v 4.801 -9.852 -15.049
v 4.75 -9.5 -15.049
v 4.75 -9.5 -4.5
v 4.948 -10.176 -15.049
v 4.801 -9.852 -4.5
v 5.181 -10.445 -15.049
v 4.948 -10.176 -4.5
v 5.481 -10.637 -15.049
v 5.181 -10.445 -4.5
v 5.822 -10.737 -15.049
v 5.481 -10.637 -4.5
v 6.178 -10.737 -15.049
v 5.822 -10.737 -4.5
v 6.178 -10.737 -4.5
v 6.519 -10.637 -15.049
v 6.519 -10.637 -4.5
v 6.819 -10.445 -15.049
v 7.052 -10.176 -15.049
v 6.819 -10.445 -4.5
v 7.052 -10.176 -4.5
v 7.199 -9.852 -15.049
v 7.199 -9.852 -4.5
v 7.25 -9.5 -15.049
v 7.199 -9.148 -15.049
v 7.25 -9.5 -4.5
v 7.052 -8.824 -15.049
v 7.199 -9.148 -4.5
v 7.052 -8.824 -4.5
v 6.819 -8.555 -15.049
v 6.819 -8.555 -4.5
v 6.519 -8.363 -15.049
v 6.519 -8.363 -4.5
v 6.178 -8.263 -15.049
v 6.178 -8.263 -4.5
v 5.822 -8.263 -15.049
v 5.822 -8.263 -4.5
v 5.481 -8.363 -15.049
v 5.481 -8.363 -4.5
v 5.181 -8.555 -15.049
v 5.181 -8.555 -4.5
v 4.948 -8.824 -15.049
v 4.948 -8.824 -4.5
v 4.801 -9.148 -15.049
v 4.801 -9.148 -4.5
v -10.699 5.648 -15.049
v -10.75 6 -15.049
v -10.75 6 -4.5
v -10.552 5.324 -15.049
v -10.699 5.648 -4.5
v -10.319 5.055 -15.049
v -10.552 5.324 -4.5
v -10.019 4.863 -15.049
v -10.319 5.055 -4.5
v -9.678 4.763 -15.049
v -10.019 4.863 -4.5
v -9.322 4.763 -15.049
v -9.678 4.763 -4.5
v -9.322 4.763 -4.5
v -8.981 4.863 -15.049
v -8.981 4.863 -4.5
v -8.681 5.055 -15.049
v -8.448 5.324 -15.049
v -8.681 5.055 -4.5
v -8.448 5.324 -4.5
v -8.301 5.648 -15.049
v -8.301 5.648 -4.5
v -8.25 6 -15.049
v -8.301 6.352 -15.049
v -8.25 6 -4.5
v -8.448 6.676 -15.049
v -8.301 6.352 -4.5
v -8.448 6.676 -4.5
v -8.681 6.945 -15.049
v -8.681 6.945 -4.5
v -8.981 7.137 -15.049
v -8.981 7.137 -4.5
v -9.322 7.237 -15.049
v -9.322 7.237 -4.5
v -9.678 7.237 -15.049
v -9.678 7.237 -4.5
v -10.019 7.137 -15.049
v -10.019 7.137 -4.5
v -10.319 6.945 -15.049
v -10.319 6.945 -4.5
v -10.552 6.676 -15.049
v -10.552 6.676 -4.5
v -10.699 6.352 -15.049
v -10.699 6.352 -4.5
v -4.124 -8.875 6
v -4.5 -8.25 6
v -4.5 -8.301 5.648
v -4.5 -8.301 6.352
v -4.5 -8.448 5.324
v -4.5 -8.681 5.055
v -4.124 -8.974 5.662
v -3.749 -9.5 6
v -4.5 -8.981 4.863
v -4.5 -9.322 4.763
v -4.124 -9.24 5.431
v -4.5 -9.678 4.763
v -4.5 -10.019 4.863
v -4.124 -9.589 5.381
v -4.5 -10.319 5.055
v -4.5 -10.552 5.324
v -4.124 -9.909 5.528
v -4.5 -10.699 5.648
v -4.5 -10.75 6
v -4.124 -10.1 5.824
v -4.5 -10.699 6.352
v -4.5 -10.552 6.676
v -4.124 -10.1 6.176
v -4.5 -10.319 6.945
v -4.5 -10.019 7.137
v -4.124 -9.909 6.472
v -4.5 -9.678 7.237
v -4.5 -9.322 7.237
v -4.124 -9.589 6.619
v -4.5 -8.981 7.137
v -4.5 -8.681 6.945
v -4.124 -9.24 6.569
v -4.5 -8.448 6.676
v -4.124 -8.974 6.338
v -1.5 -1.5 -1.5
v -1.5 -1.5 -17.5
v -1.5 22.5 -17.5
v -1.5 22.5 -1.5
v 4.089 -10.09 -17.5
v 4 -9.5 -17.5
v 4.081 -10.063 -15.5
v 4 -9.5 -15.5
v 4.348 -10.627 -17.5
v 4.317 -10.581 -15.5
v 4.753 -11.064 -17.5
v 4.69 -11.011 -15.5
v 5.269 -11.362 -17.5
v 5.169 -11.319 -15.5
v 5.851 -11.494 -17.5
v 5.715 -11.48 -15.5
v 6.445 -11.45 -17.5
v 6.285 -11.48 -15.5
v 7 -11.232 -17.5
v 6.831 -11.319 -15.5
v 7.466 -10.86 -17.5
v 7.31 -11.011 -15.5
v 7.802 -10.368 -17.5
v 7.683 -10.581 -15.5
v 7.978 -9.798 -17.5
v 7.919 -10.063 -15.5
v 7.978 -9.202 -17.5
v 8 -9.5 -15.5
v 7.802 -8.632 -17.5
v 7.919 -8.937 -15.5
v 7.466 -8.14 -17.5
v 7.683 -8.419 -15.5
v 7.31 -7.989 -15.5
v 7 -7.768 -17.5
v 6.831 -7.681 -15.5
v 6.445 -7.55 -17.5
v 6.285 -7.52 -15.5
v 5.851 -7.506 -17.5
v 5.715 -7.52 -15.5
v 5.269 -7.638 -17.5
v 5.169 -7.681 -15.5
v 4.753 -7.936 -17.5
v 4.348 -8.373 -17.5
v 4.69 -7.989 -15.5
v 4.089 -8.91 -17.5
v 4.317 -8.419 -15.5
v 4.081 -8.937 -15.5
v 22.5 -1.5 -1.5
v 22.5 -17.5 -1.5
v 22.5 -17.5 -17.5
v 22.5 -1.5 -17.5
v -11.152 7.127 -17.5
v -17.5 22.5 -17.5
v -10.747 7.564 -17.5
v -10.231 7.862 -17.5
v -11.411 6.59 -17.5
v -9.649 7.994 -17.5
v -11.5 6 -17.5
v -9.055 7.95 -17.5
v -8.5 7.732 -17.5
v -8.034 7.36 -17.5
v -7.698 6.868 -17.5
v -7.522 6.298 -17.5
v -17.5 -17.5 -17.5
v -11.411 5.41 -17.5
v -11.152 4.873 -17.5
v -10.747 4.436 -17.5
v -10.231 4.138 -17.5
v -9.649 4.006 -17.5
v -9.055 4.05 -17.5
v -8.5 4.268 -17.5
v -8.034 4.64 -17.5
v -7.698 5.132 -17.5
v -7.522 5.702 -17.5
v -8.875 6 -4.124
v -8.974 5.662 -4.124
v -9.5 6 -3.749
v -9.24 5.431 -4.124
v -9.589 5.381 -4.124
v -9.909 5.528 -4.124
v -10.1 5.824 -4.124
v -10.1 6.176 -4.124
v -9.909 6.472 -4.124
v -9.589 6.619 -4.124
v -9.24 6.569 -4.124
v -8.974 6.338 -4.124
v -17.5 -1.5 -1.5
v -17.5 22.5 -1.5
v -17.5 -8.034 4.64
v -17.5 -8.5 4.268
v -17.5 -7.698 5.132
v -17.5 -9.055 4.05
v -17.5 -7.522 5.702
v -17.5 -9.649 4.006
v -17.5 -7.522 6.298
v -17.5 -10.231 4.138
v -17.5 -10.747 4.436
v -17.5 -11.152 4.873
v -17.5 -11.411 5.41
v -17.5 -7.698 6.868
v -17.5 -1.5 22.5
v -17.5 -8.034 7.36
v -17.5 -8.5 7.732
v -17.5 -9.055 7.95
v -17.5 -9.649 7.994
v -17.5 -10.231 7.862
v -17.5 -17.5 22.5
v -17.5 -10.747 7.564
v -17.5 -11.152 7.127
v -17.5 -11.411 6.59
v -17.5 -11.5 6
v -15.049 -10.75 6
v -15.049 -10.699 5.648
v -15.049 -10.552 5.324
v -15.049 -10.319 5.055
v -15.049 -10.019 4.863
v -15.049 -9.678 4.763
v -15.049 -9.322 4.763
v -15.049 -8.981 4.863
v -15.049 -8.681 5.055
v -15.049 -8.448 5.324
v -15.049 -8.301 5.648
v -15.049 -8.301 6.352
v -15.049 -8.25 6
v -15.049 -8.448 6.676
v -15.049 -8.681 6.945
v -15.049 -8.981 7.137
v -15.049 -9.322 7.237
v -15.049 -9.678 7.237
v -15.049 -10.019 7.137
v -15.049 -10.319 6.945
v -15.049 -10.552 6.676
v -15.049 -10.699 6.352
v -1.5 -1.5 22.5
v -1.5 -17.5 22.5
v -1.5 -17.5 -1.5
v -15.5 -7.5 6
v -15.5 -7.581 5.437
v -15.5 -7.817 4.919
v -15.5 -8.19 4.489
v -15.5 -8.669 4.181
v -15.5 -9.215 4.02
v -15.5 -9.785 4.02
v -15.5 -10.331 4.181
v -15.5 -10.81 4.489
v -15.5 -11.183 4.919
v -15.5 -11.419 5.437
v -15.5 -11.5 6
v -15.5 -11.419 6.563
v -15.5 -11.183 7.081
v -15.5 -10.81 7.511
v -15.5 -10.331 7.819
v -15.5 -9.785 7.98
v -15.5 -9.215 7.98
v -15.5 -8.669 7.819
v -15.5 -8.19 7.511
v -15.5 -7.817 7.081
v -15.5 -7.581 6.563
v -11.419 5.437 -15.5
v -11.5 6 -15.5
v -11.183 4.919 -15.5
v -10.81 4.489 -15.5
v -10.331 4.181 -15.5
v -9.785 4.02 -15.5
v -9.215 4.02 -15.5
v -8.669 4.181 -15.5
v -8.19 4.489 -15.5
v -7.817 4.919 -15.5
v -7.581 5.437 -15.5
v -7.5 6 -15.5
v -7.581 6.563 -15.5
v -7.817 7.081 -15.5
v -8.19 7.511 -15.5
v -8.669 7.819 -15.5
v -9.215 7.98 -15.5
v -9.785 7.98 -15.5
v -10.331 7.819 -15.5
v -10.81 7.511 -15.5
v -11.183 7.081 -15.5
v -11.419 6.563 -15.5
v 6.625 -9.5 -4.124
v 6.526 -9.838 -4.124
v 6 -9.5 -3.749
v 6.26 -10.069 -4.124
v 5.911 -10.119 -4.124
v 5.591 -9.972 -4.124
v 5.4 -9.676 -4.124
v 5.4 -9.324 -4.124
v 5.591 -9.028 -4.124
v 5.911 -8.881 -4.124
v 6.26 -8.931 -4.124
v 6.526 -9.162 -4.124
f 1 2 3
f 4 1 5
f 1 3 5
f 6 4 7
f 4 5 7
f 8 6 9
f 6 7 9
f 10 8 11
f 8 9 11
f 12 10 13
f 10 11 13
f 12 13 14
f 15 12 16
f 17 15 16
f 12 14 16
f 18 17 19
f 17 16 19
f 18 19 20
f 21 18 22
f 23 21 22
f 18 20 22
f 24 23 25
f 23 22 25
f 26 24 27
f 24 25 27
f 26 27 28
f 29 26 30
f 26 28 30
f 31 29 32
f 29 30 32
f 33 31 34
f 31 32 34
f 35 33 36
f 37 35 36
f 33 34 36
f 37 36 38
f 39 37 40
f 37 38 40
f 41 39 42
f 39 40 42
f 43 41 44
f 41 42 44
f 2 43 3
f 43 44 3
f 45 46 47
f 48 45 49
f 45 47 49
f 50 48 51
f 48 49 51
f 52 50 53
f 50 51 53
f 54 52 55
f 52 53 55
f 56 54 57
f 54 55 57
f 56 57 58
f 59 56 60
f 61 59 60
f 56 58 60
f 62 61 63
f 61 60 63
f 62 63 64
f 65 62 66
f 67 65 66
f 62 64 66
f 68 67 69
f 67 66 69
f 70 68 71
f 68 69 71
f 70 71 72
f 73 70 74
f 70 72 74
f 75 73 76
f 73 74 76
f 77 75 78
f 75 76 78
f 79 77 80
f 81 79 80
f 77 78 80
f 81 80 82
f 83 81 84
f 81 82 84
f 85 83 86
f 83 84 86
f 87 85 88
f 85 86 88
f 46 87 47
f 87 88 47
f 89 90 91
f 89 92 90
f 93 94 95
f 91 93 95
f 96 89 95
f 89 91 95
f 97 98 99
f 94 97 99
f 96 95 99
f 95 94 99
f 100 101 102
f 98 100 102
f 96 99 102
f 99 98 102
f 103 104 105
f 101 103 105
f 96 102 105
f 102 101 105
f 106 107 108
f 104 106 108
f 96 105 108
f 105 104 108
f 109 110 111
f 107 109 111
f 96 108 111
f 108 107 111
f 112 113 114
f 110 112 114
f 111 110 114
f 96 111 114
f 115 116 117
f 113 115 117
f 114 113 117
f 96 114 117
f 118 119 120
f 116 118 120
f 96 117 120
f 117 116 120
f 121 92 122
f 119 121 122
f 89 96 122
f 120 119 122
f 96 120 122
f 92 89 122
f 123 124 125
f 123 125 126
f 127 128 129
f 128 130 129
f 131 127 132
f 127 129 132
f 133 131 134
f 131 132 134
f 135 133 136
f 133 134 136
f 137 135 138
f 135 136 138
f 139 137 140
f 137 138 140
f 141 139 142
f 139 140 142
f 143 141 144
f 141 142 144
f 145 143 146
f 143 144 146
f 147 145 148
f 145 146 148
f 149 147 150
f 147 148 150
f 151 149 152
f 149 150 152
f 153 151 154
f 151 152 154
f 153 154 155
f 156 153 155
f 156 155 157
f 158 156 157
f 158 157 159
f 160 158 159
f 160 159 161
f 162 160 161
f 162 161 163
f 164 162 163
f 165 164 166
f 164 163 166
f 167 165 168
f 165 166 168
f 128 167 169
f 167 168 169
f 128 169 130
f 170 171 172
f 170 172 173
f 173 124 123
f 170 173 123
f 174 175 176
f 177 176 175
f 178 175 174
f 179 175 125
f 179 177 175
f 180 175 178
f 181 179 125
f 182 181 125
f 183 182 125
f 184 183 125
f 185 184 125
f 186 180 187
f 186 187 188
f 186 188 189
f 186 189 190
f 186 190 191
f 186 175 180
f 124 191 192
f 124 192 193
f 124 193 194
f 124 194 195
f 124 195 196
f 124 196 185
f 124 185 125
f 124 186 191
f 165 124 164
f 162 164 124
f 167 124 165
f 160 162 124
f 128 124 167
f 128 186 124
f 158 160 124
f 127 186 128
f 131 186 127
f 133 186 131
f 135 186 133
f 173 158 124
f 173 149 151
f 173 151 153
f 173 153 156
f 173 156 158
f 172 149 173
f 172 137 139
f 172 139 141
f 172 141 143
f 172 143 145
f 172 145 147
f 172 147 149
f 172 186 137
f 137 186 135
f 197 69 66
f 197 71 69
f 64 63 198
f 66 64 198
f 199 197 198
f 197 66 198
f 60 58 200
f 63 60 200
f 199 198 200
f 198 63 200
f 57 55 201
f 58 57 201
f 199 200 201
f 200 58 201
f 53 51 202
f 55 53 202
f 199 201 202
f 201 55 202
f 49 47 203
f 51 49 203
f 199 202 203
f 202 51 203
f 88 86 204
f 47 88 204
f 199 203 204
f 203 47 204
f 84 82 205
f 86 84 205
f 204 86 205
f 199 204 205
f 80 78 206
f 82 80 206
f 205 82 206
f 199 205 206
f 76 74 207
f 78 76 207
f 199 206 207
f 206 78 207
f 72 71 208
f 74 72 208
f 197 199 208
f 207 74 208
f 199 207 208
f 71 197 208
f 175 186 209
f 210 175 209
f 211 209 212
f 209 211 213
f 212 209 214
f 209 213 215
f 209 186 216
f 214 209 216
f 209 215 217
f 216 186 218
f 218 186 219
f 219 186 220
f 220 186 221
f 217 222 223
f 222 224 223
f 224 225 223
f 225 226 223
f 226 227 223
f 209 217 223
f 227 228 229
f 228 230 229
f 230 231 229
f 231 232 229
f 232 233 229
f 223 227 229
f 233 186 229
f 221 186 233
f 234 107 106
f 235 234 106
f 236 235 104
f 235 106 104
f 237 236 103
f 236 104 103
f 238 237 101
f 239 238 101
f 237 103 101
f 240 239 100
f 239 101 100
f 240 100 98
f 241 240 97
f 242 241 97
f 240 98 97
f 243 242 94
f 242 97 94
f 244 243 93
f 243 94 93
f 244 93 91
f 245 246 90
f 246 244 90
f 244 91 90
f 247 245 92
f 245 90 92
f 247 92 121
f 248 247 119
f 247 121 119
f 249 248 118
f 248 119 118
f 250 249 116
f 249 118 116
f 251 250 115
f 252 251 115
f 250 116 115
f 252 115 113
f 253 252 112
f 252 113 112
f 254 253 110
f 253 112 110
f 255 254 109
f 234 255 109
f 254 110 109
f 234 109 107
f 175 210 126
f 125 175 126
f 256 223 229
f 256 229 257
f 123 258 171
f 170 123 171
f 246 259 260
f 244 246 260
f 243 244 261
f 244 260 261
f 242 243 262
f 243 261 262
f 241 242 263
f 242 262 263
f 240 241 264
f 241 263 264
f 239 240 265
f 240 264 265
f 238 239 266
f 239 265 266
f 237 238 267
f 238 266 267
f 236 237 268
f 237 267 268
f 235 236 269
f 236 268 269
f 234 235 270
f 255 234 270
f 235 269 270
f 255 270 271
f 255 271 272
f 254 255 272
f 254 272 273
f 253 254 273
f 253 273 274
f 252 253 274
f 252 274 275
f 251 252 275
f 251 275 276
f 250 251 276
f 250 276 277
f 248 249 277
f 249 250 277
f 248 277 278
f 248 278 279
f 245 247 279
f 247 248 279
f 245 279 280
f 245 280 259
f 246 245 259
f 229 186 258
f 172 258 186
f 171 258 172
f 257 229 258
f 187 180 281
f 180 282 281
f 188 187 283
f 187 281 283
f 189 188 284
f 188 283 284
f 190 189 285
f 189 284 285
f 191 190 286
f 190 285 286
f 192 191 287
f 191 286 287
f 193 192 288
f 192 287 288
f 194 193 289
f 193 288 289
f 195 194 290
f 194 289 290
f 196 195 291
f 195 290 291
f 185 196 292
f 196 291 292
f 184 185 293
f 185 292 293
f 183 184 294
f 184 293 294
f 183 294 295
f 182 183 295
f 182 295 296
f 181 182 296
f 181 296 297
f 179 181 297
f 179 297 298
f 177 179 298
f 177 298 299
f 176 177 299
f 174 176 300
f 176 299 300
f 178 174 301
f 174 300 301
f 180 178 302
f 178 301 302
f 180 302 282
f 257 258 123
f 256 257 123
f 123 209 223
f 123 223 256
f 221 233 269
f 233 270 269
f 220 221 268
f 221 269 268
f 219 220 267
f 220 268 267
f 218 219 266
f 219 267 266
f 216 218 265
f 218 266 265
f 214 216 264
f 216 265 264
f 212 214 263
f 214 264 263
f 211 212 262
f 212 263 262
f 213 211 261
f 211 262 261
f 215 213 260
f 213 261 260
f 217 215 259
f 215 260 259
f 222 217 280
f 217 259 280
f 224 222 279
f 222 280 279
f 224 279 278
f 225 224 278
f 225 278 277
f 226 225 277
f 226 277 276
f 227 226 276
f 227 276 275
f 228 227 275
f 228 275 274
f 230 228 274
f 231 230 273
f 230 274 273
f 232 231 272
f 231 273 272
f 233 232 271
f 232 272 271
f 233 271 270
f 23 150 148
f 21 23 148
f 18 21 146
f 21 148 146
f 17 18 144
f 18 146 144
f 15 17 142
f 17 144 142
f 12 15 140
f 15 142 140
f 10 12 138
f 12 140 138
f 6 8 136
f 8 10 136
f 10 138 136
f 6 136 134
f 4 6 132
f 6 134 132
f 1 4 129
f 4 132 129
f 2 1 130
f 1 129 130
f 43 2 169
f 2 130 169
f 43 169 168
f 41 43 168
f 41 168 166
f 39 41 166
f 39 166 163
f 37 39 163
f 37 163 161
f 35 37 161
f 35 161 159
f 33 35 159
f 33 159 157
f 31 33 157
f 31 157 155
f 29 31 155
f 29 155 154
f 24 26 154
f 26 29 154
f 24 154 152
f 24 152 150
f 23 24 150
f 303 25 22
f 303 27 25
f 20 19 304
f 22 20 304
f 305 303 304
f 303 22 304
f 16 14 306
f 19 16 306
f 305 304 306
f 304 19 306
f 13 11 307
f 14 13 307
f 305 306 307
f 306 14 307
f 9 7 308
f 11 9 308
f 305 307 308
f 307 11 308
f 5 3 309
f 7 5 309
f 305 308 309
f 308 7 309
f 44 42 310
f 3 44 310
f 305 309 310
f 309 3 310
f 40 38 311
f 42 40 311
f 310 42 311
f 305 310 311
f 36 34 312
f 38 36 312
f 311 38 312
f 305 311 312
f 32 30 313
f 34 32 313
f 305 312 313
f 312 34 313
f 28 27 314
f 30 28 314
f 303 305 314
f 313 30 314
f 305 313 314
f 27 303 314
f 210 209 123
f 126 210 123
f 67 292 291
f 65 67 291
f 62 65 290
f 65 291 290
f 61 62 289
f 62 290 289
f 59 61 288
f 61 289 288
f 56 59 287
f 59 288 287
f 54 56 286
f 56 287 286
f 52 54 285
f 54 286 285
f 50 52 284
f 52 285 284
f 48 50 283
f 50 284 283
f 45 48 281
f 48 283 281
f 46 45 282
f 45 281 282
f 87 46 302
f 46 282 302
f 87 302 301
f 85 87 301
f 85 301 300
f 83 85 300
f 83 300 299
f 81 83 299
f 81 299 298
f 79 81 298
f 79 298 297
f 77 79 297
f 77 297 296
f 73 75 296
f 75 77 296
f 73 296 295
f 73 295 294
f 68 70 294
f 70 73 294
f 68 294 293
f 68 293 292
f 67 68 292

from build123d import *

# Parameters (mm, degrees)
F3_W      = 16
F3_H      = 16
F6_DEPTH  = 40
F4_W      = 16
F4_H      = 16
F7_DEPTH  = 40
F5_W      = 16
F5_H      = 16
F8_DEPTH  = 40
F9_D      = 2.5
F9_DEPTH  = 13
F9_TIP    = 0.7510757738
F10_D     = 4
F10_DEPTH = 2
F10_TIP   = 1.2017212381
F11_D     = 2.5
F11_DEPTH = 13
F11_TIP   = 0.7510757738
F12_D     = 4
F12_DEPTH = 2
F12_TIP   = 1.2017212381
F13_D     = 2.5
F13_DEPTH = 13
F13_TIP   = 0.7510757738
F14_D     = 4
F14_DEPTH = 2
F14_TIP   = 1.2017212381


with BuildPart() as f6:
    # F3 (on offset) → F6 (new body)
    with BuildSketch(Plane.XZ.offset(17.5)):
        with Locations((-9.5, -9.5)):
            Rectangle(F3_W, F3_H)
    extrude(amount=-F6_DEPTH)

    # F4 (on offset) → F7 (join)
    with BuildSketch(Plane.YZ.offset(-17.5)):
        with Locations((-9.5, -9.5)):
            Rectangle(F4_W, F4_H)
    extrude(amount=F7_DEPTH)

    # F5 (on offset) → F8 (join)
    with BuildSketch(Plane.XY.offset(-17.5)):
        with Locations((-9.5, -9.5)):
            Rectangle(F5_W, F5_H)
    extrude(amount=F8_DEPTH)

    # F9
    with Locations(Plane(origin=(0, 0, -17.5), x_dir=(1, 0, 0), z_dir=(0, 0, -1))):
        with Locations((6, 9.5)):
            Hole(F9_D / 2, depth=F9_DEPTH)
            with Locations((0, 0, -(F9_DEPTH + F9_TIP / 2))):  # 118° drill point
                Cone(0, F9_D / 2, F9_TIP, mode=Mode.SUBTRACT)

    # F10
    with Locations(Plane(origin=(0, 0, -17.5), x_dir=(1, 0, 0), z_dir=(0, 0, -1))):
        with Locations((6, 9.5)):
            Hole(F10_D / 2, depth=F10_DEPTH)
            with Locations((0, 0, -(F10_DEPTH + F10_TIP / 2))):  # 118° drill point
                Cone(0, F10_D / 2, F10_TIP, mode=Mode.SUBTRACT)

    # F11
    with Locations(Plane(origin=(0, 0, -17.5), x_dir=(1, 0, 0), z_dir=(0, 0, -1))):
        with Locations((-9.5, -6)):
            Hole(F11_D / 2, depth=F11_DEPTH)
            with Locations((0, 0, -(F11_DEPTH + F11_TIP / 2))):  # 118° drill point
                Cone(0, F11_D / 2, F11_TIP, mode=Mode.SUBTRACT)

    # F12
    with Locations(Plane(origin=(0, 0, -17.5), x_dir=(1, 0, 0), z_dir=(0, 0, -1))):
        with Locations((-9.5, -6)):
            Hole(F12_D / 2, depth=F12_DEPTH)
            with Locations((0, 0, -(F12_DEPTH + F12_TIP / 2))):  # 118° drill point
                Cone(0, F12_D / 2, F12_TIP, mode=Mode.SUBTRACT)

    # F13
    with Locations(Plane(origin=(-17.5, 0, 0), x_dir=(0, 1, 0), z_dir=(-1, 0, 0))):
        with Locations((-9.5, -6)):
            Hole(F13_D / 2, depth=F13_DEPTH)
            with Locations((0, 0, -(F13_DEPTH + F13_TIP / 2))):  # 118° drill point
                Cone(0, F13_D / 2, F13_TIP, mode=Mode.SUBTRACT)

    # F14
    with Locations(Plane(origin=(-17.5, 0, 0), x_dir=(0, 1, 0), z_dir=(-1, 0, 0))):
        with Locations((-9.5, -6)):
            Hole(F14_D / 2, depth=F14_DEPTH)
            with Locations((0, 0, -(F14_DEPTH + F14_TIP / 2))):  # 118° drill point
                Cone(0, F14_D / 2, F14_TIP, mode=Mode.SUBTRACT)


solid = f6.part
